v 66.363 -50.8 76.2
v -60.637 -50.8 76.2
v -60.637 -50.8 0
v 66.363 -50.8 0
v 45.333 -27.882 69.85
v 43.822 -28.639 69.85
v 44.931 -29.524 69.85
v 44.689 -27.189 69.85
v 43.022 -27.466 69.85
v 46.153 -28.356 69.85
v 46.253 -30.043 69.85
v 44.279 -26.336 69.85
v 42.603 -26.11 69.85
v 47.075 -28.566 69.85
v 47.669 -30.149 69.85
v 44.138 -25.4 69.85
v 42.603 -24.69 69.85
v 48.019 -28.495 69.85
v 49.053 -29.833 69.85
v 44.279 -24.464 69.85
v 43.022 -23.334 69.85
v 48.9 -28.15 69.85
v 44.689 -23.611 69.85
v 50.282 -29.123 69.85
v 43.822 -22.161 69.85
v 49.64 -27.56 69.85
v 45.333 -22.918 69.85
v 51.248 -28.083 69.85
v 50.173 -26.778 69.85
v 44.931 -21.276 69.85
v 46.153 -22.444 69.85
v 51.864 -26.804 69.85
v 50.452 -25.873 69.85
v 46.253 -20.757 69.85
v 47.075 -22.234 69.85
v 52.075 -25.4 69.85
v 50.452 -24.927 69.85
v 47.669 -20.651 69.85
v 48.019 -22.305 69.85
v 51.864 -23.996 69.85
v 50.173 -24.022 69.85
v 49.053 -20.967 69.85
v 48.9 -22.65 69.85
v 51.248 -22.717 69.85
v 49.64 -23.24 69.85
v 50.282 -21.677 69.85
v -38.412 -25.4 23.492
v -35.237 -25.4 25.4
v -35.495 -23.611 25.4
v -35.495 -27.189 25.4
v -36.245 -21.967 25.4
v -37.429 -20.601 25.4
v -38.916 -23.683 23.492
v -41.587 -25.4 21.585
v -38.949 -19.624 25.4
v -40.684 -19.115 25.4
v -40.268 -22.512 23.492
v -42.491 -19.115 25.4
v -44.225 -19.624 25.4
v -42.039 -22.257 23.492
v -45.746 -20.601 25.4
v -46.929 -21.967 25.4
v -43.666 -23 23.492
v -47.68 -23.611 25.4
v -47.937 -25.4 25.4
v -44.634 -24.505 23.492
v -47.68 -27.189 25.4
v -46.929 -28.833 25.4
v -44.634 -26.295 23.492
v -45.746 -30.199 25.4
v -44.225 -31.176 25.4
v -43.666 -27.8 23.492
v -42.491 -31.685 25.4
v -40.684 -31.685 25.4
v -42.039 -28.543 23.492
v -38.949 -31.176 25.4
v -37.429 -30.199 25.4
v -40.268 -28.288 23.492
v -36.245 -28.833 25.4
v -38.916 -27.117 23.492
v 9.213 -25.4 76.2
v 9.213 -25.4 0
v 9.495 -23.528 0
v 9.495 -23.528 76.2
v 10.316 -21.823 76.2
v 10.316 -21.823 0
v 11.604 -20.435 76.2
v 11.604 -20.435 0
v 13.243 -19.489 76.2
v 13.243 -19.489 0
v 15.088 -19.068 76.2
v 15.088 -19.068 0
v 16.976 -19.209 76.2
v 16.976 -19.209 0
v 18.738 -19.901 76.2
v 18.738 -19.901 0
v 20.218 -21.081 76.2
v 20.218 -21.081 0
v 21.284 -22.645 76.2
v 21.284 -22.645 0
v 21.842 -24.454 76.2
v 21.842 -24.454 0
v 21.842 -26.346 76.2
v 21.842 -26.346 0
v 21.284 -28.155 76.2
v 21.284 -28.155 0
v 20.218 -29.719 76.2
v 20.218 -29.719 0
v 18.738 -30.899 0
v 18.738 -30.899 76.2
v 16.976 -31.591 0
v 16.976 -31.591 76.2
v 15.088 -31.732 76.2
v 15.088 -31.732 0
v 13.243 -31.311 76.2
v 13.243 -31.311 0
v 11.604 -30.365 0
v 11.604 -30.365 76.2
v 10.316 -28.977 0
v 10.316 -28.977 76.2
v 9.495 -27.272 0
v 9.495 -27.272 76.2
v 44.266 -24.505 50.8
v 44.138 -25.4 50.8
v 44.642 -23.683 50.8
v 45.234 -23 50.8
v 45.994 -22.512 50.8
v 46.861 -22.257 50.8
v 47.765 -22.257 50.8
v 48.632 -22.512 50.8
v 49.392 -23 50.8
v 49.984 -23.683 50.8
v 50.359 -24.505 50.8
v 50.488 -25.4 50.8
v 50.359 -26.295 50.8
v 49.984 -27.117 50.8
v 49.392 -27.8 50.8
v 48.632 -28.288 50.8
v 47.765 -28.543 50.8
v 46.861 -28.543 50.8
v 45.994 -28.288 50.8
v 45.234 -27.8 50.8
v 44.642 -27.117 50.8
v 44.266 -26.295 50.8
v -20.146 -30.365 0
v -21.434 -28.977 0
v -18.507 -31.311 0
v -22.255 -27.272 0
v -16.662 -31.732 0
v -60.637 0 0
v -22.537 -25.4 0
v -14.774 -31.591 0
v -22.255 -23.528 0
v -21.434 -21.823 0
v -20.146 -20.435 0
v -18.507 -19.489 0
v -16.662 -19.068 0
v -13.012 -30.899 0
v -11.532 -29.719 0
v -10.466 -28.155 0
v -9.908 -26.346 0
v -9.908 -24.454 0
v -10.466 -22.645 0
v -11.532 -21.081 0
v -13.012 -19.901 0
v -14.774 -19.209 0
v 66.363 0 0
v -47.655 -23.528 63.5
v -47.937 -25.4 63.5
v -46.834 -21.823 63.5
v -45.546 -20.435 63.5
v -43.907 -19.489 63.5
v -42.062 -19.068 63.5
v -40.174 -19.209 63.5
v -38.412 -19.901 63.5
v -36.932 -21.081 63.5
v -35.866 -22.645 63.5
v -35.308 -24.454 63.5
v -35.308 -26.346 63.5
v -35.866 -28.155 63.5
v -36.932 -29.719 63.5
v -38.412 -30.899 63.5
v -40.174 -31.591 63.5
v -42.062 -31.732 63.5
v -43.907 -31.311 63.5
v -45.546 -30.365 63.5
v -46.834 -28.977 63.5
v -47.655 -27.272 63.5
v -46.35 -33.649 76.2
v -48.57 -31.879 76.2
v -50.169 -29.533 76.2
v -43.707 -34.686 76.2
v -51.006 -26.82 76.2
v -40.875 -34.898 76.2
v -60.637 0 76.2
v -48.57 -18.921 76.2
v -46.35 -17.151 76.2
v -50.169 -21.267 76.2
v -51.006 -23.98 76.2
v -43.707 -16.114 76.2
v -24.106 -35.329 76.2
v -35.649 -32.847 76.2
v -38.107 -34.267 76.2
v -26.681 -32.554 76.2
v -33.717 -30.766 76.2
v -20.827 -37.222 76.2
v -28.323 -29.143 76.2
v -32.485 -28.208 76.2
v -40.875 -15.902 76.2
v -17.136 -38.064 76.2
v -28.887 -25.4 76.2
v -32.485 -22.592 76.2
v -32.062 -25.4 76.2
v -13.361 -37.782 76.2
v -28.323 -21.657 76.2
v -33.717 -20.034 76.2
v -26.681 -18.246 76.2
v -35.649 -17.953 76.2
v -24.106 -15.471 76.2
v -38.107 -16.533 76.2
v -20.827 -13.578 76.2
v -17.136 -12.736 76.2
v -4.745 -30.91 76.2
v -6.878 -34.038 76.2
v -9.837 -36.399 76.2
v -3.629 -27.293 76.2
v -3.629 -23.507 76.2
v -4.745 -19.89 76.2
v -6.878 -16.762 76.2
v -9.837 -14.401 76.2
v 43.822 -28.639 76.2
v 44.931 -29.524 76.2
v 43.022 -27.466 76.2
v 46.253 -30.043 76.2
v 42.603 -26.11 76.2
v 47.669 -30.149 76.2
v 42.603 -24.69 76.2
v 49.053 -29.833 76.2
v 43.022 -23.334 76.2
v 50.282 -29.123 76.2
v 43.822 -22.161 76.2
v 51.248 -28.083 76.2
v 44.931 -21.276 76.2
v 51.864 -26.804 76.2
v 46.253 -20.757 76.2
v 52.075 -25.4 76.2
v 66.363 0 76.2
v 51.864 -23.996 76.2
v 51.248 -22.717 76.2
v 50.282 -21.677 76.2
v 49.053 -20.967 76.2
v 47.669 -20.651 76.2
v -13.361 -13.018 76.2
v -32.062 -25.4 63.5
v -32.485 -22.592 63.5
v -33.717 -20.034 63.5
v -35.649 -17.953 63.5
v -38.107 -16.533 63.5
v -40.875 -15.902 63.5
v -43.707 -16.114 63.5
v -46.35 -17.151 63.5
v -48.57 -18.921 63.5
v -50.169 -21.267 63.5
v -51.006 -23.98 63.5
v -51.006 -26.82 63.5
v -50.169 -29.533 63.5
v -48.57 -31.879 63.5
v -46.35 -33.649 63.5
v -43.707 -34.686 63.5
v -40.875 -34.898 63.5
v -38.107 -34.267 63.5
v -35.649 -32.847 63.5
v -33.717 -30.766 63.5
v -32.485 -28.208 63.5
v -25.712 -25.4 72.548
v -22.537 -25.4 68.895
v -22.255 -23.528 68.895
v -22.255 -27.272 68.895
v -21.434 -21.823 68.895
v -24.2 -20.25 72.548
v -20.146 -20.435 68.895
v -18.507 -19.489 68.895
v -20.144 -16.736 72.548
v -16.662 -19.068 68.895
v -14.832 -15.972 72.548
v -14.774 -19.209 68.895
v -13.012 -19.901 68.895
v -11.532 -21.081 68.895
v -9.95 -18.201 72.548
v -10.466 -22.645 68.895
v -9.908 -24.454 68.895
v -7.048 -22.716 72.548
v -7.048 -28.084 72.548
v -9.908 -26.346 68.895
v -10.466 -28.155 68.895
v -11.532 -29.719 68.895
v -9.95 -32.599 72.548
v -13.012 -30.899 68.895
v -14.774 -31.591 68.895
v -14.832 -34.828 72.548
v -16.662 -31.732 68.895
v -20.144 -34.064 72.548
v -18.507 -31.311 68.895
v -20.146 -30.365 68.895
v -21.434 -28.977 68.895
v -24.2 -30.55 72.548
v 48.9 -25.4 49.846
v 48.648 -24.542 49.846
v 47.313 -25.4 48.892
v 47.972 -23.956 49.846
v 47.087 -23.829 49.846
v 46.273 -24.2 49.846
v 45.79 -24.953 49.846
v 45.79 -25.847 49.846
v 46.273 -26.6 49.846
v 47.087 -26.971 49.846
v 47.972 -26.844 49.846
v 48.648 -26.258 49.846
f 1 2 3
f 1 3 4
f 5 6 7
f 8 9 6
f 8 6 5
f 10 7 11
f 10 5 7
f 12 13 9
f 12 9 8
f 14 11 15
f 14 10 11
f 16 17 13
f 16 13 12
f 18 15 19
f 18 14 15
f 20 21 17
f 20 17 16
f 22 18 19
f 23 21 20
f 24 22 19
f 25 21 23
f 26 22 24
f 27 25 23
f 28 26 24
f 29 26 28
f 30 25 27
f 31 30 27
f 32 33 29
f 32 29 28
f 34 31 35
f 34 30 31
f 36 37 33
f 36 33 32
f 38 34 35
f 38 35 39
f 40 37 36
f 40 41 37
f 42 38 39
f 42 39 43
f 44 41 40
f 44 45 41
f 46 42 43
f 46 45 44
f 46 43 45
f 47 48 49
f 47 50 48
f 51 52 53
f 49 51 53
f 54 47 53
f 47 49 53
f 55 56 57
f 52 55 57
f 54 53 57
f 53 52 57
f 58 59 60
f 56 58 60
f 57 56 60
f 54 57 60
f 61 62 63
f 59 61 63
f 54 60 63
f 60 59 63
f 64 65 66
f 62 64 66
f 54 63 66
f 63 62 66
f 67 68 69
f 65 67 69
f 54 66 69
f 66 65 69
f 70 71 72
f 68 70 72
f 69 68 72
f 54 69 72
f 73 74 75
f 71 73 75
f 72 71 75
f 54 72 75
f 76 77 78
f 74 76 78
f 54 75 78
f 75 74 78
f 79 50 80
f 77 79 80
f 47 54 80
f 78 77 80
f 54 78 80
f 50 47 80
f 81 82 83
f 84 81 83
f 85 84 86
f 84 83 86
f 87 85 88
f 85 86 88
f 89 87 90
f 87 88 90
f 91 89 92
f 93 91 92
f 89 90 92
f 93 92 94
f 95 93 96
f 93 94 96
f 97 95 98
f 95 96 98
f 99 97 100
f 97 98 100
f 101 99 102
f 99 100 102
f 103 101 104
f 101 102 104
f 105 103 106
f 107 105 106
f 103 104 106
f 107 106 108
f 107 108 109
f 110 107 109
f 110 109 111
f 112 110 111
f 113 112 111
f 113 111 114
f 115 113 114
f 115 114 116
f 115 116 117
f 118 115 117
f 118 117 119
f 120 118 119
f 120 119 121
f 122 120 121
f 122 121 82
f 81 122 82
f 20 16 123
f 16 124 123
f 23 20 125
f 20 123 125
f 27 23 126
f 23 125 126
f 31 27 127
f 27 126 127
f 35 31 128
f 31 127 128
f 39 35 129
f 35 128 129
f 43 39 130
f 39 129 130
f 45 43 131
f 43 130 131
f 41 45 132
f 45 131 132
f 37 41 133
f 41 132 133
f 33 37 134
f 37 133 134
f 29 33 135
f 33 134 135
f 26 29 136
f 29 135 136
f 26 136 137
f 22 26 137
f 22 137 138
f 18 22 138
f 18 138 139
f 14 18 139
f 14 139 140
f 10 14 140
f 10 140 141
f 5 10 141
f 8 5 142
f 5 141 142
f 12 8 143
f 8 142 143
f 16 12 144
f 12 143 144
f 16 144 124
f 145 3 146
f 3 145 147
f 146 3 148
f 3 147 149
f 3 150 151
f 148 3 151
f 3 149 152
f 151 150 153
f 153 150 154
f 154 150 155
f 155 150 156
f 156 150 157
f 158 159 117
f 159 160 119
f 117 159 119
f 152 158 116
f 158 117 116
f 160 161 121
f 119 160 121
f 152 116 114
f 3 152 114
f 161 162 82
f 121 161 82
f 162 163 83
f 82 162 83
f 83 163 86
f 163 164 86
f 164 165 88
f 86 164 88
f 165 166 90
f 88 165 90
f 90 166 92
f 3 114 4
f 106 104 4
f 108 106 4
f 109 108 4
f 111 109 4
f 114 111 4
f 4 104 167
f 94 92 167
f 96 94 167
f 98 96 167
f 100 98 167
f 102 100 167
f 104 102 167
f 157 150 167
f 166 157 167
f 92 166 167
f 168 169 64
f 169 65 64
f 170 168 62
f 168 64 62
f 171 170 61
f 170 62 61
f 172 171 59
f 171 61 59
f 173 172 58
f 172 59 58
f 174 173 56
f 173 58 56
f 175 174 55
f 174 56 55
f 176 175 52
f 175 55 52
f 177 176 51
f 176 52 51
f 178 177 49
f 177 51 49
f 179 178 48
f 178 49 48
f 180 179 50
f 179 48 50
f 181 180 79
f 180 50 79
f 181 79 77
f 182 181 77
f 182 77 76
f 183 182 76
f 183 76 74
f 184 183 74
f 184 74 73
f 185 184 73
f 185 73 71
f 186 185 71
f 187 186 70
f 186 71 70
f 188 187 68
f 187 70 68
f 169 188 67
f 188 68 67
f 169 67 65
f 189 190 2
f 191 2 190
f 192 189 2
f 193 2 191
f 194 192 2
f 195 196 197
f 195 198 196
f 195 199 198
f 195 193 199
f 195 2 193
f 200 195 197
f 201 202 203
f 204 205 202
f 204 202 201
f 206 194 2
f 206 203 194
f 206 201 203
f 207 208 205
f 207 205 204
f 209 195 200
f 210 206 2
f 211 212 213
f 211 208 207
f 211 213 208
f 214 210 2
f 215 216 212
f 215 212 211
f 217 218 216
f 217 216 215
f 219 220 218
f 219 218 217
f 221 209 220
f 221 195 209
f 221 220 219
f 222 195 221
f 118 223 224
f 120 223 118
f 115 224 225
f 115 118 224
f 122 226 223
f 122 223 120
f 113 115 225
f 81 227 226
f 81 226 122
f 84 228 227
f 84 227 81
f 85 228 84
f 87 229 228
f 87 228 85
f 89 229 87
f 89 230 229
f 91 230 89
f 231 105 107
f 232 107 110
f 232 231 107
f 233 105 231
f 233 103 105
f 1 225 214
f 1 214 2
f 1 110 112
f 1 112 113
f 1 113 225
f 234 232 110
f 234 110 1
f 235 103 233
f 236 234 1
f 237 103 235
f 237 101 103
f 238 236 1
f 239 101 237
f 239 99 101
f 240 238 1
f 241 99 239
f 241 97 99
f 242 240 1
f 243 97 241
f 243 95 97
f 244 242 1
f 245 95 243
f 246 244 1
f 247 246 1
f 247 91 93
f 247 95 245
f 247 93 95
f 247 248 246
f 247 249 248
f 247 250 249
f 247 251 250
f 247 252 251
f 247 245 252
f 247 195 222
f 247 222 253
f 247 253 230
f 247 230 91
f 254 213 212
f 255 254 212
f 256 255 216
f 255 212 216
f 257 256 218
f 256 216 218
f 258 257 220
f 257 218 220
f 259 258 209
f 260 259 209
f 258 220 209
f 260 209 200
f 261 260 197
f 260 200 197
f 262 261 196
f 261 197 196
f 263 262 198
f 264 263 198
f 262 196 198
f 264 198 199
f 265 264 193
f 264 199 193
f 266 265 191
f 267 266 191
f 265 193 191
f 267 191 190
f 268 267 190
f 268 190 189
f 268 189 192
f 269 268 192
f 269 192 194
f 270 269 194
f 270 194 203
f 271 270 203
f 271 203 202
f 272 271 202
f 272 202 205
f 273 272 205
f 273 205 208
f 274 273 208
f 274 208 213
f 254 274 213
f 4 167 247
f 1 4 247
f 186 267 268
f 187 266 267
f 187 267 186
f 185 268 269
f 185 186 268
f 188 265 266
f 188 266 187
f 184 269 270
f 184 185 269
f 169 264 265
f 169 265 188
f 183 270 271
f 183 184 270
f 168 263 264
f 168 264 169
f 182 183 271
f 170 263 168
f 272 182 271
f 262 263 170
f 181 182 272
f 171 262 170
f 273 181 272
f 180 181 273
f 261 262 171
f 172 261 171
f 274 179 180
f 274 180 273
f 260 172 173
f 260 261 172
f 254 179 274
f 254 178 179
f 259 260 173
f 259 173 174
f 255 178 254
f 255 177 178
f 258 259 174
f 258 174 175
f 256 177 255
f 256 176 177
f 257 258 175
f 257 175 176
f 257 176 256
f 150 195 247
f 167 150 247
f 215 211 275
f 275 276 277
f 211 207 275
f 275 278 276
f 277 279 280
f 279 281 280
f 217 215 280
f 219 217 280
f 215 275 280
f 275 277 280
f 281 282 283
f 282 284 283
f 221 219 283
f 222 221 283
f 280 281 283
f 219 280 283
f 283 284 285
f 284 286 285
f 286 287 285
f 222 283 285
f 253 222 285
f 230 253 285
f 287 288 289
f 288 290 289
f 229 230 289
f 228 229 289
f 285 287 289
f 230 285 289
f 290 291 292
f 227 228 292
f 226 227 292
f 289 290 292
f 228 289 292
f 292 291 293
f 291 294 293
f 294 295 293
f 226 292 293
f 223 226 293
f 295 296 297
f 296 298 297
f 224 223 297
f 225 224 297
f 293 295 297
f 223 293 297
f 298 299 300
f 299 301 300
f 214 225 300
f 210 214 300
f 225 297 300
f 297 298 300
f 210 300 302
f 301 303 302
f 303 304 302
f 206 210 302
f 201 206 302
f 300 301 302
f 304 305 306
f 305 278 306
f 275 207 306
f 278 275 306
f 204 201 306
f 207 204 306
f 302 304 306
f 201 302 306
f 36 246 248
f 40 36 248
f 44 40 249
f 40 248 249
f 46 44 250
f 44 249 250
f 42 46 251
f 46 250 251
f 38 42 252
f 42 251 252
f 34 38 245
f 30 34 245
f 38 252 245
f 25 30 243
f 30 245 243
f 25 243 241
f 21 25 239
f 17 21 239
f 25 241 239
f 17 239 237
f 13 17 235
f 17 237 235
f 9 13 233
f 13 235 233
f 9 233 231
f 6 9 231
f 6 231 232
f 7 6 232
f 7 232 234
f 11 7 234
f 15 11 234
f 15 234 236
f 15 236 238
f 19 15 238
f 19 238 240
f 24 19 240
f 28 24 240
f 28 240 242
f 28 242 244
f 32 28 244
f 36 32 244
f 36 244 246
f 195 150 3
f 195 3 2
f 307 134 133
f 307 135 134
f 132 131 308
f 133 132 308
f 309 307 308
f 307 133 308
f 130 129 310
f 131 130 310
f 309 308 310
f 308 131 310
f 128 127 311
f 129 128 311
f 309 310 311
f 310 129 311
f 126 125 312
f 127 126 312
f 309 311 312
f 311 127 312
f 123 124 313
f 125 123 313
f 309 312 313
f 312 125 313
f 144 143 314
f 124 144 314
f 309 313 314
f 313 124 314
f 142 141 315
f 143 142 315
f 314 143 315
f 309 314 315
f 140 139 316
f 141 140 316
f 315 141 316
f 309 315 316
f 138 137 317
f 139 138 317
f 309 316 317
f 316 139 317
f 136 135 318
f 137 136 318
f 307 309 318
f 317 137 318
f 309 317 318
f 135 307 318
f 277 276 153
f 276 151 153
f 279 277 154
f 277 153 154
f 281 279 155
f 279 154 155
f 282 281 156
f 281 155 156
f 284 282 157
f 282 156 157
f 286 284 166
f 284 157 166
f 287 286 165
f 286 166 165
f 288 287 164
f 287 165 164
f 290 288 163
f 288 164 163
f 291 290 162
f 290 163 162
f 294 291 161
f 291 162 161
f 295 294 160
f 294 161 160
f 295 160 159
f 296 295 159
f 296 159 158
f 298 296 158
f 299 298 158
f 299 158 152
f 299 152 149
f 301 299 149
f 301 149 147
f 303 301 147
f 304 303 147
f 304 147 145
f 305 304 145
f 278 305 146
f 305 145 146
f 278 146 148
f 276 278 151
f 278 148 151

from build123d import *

# Parameters (mm, degrees)
F0_W           = 127
F0_H           = 76.2
F1_DEPTH       = 50.8
F3_D           = 12.7
F3_DEPTH       = 50.8
F3_CBORE_D     = 19.05
F3_CBORE_DEPTH = 12.7
F3_TIP         = 3.8154649308
F5_D           = 12.7
F5_CSINK_D     = 25.4
F5_CSINK_ANGLE = 82
F7_D           = 12.7
F9_D           = 6.35
F9_DEPTH       = 25.4
F9_CBORE_D     = 9.525
F9_CBORE_DEPTH = 6.35
F9_TIP         = 1.9077324654


with BuildPart() as f1:
    # F0 (on Front) → F1 (new body)
    with BuildSketch(Plane.XZ):
        with Locations((2.8626964785, 38.1)):
            Rectangle(F0_W, F0_H)
    extrude(amount=F1_DEPTH)

    # F3
    with Locations(Plane.XY.offset(76.2)):
        with Locations((-41.5873035215, -25.4)):
            CounterBoreHole(F3_D / 2, F3_CBORE_D / 2, F3_CBORE_DEPTH, depth=F3_DEPTH)
            with Locations((0, 0, -(F3_DEPTH + F3_TIP / 2))):  # 118° drill point
                Cone(0, F3_D / 2, F3_TIP, mode=Mode.SUBTRACT)

    # F5 (through all)
    with Locations(Plane.XY.offset(76.2)):
        with Locations((-16.1873035215, -25.4)):
            CounterSinkHole(F5_D / 2, F5_CSINK_D / 2, counter_sink_angle=F5_CSINK_ANGLE)

    # F7 (through all)
    with Locations(Plane.XY.offset(76.2)):
        with Locations((15.5626964785, -25.4)):
            Hole(F7_D / 2)

    # F9
    with Locations(Plane.XY.offset(76.2)):
        with Locations((47.3126964785, -25.4)):
            CounterBoreHole(F9_D / 2, F9_CBORE_D / 2, F9_CBORE_DEPTH, depth=F9_DEPTH)
            with Locations((0, 0, -(F9_DEPTH + F9_TIP / 2))):  # 118° drill point
                Cone(0, F9_D / 2, F9_TIP, mode=Mode.SUBTRACT)


solid = f1.part
